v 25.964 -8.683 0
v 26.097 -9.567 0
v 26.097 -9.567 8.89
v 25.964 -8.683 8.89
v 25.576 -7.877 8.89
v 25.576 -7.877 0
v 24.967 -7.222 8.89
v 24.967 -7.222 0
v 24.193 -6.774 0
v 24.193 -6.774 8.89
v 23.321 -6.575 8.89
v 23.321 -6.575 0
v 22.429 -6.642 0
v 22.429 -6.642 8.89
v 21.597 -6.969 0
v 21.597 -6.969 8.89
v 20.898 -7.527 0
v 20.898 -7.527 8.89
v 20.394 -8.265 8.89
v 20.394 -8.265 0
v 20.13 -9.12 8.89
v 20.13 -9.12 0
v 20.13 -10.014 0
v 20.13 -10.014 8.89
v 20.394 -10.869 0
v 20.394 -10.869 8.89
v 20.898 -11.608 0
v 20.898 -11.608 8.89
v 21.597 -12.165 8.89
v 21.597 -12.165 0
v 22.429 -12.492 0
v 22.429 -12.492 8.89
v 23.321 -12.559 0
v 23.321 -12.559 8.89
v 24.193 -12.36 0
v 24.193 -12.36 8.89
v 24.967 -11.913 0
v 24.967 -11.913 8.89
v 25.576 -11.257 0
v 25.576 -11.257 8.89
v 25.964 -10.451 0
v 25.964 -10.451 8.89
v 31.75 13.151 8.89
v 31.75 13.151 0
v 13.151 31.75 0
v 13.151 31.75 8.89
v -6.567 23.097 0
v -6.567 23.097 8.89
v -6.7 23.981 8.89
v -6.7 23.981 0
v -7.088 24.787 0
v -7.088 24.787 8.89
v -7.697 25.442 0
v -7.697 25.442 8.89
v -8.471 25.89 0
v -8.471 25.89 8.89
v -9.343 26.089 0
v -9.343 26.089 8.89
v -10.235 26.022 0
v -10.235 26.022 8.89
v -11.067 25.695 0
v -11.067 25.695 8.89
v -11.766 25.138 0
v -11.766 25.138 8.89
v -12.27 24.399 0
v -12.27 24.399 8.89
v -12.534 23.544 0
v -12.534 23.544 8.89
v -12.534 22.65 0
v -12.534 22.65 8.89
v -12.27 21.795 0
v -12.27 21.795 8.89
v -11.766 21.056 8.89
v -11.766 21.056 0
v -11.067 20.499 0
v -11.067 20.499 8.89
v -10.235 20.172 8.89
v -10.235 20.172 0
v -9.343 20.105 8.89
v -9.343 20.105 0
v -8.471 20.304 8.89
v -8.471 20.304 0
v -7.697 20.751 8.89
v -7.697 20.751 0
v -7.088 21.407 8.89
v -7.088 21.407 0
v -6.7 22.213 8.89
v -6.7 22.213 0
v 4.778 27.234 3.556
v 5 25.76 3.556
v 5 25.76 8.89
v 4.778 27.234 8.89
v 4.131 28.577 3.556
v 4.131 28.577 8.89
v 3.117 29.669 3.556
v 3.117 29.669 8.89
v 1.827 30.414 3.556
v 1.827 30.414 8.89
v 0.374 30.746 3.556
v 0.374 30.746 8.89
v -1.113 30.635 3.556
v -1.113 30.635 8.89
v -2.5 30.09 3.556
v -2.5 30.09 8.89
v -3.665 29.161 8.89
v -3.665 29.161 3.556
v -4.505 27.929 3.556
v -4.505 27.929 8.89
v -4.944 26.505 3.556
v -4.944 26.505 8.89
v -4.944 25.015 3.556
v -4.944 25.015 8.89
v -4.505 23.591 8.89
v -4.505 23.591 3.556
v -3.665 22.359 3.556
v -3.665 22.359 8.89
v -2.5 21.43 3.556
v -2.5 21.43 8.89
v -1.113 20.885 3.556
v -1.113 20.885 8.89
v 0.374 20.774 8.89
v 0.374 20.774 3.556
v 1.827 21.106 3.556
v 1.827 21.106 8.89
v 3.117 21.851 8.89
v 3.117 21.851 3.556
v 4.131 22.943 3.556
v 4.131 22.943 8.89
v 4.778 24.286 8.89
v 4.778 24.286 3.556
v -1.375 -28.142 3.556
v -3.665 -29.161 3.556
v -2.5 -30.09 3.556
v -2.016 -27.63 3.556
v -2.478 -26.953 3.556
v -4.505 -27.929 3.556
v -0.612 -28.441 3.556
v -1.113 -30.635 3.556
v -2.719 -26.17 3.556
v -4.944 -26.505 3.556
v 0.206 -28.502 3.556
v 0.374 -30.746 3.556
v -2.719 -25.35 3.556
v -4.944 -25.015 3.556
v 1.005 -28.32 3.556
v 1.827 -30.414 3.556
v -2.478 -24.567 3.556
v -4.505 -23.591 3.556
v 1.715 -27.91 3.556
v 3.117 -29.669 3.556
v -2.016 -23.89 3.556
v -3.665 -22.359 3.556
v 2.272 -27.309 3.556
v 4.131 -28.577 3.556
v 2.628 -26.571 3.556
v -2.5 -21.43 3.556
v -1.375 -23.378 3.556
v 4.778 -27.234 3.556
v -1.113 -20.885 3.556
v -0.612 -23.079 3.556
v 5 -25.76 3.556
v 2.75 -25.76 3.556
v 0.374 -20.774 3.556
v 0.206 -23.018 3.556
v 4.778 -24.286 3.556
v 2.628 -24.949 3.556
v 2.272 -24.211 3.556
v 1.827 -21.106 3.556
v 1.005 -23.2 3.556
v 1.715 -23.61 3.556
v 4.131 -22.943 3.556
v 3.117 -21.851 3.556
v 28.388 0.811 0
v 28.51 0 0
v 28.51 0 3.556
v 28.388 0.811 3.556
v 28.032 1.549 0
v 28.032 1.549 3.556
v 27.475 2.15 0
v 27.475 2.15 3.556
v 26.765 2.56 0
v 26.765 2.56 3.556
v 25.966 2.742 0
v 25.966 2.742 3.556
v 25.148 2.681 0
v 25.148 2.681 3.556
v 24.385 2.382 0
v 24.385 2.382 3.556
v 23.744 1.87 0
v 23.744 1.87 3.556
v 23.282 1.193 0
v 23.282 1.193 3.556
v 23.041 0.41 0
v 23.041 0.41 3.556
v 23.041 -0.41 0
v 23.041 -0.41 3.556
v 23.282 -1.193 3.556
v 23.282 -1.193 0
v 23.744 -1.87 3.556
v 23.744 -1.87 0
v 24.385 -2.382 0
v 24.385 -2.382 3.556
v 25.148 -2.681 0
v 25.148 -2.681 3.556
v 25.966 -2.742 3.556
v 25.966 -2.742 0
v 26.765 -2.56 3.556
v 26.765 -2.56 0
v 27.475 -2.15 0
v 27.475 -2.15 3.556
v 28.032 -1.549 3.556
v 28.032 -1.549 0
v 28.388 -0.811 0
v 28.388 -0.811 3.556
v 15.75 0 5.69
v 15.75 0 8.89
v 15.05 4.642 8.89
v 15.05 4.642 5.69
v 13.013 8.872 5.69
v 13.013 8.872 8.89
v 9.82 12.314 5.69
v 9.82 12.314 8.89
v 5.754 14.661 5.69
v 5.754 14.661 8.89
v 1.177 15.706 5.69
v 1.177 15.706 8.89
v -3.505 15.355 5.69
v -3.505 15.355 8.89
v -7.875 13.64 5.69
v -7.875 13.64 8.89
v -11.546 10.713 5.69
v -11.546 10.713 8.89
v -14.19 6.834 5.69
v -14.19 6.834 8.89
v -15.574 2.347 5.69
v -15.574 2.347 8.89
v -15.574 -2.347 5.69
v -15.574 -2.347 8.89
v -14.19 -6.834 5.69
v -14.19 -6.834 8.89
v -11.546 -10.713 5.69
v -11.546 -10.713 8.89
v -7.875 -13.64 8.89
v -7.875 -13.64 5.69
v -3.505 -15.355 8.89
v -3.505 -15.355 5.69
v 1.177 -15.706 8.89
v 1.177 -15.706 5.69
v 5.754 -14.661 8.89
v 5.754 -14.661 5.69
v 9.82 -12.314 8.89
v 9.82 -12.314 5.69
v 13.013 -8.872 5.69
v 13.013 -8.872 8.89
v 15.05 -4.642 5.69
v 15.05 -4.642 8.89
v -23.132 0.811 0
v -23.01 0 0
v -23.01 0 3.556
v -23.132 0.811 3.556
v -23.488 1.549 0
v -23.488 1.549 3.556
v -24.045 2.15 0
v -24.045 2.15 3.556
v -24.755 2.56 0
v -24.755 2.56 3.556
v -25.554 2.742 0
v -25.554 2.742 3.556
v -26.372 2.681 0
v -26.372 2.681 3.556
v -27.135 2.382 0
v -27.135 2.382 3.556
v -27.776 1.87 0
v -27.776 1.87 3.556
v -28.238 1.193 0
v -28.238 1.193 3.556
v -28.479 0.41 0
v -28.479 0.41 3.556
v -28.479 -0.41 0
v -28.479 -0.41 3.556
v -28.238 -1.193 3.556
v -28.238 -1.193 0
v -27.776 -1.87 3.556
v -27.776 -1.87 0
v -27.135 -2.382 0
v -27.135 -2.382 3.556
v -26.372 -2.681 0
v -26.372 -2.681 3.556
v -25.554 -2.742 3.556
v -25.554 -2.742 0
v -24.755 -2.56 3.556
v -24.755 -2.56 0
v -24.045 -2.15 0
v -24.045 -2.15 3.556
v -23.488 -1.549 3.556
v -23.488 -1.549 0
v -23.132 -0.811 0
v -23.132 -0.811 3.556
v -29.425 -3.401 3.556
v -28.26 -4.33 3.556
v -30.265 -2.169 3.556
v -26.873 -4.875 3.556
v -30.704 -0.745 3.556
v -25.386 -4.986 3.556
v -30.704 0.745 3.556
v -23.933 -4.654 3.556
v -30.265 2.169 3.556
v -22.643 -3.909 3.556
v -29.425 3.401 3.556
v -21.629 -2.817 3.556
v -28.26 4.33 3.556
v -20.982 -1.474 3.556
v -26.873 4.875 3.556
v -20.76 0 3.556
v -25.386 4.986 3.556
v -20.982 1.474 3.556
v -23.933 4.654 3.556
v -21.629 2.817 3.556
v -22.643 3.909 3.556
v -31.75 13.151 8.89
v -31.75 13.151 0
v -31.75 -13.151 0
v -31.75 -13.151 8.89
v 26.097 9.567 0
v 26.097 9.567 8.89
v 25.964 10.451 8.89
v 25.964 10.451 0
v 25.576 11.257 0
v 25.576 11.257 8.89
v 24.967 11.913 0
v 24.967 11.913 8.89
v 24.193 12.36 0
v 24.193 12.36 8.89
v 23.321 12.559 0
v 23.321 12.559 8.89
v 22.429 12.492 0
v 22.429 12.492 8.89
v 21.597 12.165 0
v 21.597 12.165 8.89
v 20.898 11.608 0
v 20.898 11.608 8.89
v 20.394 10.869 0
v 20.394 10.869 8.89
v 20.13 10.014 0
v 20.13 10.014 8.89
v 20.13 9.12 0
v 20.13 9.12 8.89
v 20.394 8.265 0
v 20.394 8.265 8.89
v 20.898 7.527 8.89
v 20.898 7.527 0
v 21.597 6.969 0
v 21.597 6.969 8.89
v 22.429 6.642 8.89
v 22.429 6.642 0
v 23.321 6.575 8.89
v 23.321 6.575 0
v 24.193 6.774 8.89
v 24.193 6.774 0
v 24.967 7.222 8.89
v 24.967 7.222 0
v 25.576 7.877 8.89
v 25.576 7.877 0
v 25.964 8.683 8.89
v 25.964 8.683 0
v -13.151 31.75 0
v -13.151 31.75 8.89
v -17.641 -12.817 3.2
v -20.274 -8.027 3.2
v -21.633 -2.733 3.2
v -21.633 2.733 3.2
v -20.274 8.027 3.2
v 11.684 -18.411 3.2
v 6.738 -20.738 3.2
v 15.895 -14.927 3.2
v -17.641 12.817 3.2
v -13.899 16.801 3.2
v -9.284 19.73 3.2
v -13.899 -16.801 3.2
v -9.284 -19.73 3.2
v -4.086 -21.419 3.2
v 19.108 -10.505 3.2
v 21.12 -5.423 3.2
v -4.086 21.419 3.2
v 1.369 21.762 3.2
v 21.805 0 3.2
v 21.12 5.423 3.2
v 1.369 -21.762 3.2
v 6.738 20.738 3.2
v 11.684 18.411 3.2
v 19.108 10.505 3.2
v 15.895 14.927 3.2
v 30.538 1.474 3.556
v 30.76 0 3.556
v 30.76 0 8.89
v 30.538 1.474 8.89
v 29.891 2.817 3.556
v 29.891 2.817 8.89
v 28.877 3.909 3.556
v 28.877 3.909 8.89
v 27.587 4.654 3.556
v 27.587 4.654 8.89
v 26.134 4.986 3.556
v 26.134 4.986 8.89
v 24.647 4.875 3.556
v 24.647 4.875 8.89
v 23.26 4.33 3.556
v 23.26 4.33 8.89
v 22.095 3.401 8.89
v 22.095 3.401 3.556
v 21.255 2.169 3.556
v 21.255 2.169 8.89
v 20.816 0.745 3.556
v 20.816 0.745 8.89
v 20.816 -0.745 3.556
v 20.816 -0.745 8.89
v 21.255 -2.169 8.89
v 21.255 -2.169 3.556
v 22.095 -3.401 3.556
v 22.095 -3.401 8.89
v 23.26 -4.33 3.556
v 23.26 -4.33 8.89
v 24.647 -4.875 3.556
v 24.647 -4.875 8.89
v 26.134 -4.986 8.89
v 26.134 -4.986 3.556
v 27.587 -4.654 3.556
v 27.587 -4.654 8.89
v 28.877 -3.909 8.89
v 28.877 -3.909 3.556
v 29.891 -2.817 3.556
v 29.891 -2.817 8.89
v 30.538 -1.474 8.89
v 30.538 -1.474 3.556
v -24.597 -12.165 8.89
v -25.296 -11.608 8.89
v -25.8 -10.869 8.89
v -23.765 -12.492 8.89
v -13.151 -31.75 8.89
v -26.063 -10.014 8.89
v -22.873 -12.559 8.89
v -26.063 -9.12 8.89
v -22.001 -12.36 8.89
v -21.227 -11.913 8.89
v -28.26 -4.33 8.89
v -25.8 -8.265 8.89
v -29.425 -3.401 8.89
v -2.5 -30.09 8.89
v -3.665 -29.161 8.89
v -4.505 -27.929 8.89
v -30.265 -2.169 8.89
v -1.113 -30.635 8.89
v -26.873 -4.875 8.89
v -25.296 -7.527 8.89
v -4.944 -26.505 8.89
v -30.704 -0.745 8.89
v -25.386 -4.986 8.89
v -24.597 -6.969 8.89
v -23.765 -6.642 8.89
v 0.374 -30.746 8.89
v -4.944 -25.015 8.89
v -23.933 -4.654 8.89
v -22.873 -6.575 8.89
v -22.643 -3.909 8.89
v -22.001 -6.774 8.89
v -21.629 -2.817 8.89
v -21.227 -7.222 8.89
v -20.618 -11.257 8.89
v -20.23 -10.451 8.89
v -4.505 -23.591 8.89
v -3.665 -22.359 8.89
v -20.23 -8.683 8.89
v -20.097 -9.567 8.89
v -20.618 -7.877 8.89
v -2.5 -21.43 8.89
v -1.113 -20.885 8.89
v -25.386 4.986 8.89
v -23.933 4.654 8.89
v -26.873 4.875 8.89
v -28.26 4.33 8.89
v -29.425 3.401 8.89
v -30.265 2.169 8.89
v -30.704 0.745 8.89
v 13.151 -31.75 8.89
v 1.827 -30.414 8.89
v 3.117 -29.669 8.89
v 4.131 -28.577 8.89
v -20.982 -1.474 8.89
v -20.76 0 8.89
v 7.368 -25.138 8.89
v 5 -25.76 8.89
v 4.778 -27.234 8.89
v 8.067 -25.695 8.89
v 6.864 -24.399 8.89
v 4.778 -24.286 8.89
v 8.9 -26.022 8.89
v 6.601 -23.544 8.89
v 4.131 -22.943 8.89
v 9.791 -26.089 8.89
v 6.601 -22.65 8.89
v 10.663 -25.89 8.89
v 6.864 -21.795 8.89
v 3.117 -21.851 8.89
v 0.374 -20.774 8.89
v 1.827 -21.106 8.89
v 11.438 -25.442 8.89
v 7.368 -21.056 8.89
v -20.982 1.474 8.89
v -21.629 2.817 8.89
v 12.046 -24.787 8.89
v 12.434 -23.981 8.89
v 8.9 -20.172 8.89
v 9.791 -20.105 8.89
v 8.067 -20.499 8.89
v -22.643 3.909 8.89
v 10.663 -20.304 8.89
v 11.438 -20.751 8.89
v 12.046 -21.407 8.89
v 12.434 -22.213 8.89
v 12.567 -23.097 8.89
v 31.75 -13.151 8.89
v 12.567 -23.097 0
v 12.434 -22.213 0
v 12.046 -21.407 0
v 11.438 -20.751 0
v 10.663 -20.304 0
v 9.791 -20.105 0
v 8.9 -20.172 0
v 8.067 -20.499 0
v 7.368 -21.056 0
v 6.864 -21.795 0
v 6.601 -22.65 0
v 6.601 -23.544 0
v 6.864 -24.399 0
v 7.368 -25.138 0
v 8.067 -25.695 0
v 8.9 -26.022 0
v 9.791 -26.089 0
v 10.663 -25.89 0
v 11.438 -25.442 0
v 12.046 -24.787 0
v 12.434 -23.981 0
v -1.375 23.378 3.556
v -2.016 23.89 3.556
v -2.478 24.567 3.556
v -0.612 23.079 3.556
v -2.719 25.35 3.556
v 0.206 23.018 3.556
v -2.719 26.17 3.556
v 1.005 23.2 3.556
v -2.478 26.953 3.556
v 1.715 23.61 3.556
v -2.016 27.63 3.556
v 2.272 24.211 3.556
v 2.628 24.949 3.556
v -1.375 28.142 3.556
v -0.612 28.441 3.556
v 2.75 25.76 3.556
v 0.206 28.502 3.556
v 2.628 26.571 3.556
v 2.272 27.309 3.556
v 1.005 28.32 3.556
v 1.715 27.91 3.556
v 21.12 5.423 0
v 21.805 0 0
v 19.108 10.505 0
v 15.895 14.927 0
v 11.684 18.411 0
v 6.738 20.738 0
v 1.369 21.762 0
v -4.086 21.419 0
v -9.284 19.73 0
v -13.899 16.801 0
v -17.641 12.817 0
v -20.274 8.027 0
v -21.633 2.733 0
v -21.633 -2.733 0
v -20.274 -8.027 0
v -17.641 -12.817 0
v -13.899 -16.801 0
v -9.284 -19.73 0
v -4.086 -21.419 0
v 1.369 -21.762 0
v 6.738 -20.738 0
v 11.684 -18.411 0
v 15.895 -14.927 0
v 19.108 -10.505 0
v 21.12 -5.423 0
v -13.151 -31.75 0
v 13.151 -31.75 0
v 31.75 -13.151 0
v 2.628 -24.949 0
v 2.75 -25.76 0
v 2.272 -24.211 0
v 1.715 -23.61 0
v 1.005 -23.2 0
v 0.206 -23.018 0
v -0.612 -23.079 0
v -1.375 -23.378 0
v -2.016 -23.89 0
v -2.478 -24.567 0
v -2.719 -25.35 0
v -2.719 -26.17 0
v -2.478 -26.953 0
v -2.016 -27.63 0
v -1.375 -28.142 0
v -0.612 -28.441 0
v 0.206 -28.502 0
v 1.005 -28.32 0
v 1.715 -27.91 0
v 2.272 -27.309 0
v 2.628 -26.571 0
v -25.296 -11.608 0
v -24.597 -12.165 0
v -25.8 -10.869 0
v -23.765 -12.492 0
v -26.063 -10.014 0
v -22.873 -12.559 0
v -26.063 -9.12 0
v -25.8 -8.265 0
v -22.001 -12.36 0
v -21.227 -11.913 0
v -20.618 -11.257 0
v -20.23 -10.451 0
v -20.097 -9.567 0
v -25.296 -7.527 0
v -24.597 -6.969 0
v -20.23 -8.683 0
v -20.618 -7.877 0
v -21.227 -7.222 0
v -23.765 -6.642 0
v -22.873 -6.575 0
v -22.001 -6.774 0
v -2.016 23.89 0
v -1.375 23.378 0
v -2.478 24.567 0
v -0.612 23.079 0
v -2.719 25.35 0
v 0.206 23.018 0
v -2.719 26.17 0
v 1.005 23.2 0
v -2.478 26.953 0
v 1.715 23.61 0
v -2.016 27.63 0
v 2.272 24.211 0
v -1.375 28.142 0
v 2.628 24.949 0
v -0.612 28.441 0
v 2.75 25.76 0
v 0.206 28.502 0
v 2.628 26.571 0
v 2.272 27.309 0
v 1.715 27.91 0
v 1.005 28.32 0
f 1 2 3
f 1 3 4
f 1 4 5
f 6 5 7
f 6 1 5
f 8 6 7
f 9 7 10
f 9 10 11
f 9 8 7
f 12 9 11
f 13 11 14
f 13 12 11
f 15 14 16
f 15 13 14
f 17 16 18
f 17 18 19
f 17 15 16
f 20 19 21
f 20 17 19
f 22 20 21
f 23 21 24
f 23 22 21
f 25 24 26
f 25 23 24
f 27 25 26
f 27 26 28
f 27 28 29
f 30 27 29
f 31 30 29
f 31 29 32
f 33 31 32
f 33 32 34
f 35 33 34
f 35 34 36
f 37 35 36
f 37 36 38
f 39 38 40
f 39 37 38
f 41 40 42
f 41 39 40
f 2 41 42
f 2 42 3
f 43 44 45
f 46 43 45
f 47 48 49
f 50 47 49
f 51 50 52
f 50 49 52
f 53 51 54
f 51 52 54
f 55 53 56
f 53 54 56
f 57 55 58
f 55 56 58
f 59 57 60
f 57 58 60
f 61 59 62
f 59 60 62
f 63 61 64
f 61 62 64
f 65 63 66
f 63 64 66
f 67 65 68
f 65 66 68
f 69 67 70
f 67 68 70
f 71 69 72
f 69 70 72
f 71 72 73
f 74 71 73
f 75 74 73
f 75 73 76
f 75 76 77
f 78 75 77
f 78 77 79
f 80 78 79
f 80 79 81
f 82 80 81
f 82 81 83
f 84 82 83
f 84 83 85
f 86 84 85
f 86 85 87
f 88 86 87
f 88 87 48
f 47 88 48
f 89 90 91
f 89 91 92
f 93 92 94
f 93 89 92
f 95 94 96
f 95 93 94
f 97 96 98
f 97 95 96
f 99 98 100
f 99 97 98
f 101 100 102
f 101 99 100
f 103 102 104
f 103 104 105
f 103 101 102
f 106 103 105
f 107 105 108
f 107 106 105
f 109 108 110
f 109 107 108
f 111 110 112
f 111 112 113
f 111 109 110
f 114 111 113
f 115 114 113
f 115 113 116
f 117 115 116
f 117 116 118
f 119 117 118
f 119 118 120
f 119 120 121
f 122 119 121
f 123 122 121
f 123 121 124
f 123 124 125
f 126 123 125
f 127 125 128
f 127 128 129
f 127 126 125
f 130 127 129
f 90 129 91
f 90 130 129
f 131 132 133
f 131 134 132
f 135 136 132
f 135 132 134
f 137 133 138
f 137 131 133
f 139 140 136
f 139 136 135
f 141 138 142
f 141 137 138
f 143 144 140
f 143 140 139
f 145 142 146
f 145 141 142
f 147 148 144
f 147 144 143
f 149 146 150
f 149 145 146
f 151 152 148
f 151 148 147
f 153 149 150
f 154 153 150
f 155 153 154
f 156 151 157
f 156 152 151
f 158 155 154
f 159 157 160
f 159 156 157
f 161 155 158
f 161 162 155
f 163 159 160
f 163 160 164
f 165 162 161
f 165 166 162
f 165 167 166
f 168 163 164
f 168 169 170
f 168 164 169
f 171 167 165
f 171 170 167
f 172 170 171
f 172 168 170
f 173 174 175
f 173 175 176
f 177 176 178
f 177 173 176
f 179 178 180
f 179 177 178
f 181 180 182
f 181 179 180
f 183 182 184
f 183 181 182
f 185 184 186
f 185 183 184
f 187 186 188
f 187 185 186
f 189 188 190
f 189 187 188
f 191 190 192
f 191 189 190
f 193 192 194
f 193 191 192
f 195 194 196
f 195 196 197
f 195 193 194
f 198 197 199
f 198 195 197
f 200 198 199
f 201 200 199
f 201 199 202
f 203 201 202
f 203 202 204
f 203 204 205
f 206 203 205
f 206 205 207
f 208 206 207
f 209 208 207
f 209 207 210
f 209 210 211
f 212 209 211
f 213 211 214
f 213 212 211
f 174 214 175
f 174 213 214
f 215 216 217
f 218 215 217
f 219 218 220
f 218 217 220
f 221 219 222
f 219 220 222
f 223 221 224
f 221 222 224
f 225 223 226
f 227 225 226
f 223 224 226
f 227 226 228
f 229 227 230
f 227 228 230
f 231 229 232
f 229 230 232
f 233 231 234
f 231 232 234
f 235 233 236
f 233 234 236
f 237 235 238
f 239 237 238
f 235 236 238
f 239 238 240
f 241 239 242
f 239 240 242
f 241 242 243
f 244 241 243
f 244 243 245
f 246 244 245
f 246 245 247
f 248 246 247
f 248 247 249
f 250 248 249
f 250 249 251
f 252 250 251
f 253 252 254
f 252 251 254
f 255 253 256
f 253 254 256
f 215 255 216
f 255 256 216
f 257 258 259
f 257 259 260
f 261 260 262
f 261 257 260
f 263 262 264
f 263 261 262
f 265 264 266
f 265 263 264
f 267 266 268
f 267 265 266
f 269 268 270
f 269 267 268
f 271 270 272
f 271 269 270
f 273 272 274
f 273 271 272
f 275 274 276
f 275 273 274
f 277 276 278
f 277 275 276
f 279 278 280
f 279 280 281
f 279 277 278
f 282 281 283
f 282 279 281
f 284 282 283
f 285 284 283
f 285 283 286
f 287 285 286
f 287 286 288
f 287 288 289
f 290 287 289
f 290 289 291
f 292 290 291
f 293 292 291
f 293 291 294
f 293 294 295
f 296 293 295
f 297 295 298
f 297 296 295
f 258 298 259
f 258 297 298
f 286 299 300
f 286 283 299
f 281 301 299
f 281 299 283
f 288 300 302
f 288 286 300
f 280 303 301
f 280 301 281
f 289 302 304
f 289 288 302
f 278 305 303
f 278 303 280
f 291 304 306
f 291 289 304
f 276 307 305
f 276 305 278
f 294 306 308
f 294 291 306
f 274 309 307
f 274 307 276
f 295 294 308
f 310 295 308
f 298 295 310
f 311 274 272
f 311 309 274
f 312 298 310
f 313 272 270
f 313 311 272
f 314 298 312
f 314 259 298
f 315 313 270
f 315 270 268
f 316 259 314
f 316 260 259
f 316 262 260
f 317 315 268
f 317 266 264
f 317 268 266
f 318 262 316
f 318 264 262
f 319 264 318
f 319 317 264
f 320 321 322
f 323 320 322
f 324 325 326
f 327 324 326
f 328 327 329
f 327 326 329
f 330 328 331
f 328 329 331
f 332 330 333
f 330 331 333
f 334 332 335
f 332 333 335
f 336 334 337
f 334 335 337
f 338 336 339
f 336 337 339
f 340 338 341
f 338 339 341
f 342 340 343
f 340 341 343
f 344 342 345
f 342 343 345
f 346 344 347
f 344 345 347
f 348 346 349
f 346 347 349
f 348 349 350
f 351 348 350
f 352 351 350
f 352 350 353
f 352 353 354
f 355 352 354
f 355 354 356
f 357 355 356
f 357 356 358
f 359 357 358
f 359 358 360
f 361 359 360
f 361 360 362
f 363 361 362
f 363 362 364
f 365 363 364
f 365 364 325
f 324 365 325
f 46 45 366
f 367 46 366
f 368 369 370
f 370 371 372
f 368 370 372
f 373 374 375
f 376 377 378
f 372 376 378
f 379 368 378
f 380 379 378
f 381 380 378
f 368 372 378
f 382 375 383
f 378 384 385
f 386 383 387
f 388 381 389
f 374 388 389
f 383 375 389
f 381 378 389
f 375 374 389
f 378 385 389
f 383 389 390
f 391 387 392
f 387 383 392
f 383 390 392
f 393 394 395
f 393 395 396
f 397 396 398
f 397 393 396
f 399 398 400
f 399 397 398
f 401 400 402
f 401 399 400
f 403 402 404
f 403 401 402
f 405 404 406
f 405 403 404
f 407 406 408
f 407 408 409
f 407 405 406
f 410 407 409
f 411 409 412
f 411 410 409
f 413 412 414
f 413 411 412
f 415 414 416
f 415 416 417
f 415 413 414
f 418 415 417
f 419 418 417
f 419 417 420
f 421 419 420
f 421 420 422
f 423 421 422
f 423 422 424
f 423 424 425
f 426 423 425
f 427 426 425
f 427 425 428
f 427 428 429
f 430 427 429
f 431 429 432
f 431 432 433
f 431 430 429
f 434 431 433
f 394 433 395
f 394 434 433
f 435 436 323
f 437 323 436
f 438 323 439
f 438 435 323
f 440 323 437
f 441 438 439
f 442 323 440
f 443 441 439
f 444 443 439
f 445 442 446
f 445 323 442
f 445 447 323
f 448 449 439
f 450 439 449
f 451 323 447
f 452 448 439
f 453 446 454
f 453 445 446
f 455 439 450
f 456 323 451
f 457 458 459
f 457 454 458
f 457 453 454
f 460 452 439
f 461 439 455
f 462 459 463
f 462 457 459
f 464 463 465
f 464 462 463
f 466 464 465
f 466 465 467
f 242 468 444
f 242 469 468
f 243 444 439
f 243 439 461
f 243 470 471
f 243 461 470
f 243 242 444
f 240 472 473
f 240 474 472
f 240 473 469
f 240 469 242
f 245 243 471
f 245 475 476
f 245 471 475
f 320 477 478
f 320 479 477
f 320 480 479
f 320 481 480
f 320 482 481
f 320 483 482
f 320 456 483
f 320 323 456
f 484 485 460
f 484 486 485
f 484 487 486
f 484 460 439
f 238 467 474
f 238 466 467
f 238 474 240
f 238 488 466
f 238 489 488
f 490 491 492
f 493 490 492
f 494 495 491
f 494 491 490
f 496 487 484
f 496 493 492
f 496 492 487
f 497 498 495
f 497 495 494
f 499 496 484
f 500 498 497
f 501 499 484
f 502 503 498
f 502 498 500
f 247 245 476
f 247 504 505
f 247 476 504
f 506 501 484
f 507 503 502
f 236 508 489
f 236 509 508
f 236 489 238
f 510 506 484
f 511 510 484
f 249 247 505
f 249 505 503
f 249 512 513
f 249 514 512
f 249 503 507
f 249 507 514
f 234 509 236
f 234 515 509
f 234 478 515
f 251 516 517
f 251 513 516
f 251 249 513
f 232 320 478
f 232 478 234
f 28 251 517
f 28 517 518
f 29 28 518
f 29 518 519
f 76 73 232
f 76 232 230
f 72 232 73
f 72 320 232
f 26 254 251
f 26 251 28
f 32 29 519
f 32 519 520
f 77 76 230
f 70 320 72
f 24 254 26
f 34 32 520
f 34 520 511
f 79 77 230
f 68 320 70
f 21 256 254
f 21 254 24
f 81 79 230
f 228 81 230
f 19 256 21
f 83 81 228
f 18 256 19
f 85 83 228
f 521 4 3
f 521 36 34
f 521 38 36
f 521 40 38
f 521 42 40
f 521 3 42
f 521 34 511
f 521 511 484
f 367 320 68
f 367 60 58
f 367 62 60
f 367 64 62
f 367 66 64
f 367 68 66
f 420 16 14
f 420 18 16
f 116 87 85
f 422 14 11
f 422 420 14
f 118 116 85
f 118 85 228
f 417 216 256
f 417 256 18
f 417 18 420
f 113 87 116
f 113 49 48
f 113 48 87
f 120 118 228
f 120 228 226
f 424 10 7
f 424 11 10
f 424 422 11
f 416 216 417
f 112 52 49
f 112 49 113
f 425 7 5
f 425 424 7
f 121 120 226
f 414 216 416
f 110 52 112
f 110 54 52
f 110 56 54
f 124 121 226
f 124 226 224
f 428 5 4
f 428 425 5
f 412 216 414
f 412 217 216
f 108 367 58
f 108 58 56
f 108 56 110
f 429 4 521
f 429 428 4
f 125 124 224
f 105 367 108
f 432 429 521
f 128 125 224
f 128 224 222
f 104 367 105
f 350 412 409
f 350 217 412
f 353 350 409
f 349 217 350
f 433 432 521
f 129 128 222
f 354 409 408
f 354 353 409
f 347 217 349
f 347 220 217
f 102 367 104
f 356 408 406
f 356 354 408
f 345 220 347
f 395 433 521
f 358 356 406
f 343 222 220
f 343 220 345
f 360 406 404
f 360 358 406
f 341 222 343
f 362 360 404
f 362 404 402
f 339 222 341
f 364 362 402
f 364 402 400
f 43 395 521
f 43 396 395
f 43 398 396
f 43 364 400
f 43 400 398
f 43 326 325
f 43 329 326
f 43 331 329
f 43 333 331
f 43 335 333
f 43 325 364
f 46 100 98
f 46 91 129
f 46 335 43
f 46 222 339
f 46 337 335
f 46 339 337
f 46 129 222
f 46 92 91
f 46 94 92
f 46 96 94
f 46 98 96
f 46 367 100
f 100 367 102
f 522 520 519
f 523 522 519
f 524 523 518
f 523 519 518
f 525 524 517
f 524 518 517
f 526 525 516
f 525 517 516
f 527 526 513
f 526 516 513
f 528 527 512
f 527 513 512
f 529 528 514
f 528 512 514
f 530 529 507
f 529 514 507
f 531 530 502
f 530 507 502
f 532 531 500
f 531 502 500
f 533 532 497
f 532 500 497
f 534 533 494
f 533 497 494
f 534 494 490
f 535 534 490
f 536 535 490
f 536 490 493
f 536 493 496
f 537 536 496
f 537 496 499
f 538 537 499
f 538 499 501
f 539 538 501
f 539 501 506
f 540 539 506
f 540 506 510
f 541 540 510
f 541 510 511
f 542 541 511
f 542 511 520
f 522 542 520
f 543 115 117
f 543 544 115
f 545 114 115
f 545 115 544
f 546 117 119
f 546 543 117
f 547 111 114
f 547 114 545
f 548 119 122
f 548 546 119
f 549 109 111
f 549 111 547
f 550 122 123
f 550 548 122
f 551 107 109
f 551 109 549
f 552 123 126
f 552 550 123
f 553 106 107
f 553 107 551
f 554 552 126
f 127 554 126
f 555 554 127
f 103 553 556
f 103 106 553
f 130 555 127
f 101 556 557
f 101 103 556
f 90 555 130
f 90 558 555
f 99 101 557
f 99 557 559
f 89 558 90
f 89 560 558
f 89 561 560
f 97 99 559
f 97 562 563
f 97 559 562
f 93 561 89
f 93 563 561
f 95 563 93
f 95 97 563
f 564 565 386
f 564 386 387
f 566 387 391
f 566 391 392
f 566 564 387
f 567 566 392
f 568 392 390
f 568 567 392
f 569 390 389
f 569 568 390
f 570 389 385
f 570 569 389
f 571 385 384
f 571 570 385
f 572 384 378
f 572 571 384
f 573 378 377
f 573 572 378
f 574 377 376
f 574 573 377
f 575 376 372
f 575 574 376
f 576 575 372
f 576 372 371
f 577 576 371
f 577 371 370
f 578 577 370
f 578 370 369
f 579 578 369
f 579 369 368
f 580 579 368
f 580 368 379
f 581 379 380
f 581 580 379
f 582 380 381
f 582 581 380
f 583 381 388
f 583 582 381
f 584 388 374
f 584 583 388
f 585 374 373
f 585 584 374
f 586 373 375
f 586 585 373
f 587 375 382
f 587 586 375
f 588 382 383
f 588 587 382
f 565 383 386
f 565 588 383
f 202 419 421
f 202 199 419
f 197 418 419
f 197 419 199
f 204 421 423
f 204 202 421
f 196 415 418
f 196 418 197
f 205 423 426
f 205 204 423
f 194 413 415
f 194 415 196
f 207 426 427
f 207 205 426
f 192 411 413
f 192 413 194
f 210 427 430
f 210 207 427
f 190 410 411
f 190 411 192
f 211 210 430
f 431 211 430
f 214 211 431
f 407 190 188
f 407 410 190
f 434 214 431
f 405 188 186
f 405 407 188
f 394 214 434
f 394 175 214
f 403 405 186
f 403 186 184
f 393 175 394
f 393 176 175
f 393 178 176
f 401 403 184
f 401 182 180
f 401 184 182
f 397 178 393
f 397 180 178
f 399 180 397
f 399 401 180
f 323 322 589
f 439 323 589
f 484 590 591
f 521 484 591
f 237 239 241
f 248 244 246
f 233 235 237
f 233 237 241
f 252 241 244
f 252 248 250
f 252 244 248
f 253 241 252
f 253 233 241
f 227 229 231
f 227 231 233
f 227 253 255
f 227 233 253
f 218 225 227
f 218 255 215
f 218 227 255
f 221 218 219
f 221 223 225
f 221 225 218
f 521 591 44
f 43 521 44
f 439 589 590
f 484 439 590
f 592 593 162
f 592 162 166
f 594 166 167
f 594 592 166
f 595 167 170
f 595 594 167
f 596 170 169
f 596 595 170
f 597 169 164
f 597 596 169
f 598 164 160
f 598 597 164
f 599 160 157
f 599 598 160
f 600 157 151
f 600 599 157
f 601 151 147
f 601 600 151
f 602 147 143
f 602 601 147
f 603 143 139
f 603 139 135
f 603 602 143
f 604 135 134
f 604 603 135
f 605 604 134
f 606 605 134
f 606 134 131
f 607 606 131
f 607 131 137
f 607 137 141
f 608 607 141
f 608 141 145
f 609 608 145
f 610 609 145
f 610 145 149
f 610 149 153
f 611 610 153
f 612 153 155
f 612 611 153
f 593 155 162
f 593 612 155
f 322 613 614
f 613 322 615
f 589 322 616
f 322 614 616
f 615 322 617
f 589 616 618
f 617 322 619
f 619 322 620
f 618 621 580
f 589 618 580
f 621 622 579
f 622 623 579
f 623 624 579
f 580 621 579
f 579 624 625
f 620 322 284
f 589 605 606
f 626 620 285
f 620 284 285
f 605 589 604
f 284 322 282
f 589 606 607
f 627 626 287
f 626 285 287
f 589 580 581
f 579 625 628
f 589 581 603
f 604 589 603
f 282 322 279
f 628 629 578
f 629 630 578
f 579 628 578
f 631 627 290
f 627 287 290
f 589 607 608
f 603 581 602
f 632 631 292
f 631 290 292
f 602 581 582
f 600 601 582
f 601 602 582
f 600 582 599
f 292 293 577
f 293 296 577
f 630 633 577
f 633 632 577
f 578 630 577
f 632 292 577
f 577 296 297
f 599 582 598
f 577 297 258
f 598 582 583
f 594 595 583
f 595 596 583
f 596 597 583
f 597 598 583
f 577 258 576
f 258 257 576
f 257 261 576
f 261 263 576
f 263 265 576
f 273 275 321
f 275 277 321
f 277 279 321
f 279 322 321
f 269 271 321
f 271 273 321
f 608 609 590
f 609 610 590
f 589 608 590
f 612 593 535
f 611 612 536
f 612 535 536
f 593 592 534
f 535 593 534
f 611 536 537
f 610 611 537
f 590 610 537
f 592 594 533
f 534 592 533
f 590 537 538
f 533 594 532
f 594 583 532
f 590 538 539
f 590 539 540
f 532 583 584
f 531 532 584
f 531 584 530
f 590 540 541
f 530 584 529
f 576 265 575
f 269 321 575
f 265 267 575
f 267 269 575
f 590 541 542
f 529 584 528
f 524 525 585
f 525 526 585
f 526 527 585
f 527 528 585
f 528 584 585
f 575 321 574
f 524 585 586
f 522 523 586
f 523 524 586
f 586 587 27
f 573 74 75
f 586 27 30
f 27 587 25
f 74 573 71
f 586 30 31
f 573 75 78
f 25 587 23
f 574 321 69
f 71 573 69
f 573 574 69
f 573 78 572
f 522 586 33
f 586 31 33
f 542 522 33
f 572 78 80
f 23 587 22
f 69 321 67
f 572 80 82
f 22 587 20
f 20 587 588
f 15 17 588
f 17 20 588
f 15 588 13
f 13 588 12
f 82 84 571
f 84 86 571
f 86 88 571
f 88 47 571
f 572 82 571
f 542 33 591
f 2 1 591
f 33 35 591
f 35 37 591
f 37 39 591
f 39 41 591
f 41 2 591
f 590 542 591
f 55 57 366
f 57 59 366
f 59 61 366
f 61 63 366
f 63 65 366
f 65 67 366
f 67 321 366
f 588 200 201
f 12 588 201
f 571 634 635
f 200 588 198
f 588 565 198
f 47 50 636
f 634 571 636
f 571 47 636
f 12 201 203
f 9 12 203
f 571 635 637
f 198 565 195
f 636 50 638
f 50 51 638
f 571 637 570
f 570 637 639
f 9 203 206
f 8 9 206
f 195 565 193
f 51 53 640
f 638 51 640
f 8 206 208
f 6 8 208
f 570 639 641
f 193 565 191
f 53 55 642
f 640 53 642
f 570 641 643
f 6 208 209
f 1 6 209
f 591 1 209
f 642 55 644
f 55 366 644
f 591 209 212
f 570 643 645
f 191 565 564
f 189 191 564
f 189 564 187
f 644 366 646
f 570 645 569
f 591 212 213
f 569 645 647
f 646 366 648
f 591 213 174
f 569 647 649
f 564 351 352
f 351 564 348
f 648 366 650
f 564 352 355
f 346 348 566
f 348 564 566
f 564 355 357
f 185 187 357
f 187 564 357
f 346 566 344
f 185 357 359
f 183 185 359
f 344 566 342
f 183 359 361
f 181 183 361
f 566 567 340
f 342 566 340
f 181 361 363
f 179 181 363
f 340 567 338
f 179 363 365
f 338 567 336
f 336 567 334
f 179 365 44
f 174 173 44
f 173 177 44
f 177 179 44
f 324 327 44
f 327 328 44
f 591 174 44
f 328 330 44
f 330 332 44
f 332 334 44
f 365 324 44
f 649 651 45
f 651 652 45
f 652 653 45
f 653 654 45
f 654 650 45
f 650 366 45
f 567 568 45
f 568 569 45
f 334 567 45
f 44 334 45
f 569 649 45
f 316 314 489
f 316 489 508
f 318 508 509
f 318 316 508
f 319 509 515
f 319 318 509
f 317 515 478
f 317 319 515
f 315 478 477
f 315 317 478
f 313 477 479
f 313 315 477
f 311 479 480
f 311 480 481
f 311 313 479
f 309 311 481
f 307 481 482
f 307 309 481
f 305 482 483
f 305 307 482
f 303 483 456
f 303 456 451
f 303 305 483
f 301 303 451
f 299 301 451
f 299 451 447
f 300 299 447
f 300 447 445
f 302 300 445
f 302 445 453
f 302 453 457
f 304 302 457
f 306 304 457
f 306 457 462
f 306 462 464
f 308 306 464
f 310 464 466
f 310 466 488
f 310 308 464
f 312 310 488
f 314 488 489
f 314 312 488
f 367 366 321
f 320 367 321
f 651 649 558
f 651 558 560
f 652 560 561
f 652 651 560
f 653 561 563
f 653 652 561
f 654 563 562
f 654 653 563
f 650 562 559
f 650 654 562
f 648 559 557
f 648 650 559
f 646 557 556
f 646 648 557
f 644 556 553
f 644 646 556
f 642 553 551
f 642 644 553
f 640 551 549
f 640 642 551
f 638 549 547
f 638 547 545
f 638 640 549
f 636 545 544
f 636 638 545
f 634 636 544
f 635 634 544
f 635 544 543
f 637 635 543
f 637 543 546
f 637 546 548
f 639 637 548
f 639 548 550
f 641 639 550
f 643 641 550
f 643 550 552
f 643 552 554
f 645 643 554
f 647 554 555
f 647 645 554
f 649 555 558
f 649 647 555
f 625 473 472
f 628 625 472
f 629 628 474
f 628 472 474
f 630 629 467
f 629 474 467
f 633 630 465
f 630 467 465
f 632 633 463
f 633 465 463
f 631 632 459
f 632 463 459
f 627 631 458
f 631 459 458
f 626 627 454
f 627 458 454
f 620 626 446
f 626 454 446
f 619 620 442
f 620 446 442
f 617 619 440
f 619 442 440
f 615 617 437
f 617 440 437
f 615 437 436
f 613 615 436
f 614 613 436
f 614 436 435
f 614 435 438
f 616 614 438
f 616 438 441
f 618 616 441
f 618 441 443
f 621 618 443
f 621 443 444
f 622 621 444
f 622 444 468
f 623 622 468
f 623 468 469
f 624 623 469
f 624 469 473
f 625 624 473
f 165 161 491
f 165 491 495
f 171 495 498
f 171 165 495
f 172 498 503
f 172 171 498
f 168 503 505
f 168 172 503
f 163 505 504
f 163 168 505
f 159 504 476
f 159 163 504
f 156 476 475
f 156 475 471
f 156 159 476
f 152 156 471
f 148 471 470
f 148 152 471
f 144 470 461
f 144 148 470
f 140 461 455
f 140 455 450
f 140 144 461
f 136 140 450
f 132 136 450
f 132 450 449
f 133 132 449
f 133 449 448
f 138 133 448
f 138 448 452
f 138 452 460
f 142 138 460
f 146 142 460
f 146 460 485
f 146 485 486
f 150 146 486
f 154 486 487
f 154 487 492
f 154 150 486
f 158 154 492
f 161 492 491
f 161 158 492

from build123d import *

# Parameters (mm, degrees)
BOSS_EXTRUDE1_DEPTH       = 8.89
SKETCH2_3_R               = 21.805
CUT_EXTRUDE1_DEPTH        = 3.2
ADVANCEDHOLE1_START       = 3.556
ADVANCEDHOLE1_OUTLINE_R   = 5
ADVANCEDHOLE1_DEPTH       = 5.334
ADVANCEDHOLE1_2_OUTLINE_R = 2.75
ADVANCEDHOLE1_2_DEPTH     = 3.556
SKETCH12_R                = 15.75
CUT_EXTRUDE2_DEPTH        = 3.2
ADVANCEDHOLE5_OUTLINE_R   = 3
ADVANCEDHOLE5_DEPTH       = 8.89
M6X1_0_TAPPED_HOLE1_D     = 6


# Read off the part's stored shape, not the designer's step: AdvancedHole1, AdvancedHole5
with BuildPart() as part:
    # Sketch2 → Boss-Extrude1 (new body)
    with BuildSketch(Plane.XY):
        Polygon((-13.151280605, 31.75), (-31.75, 13.151280605), (-31.75, -13.151280605), (-13.151280605, -31.75), (13.151280605, -31.75), (31.75, -13.151280605), (31.75, 13.151280605), (13.151280605, 31.75), align=None)
    extrude(amount=BOSS_EXTRUDE1_DEPTH)

    # Sketch2<3> → Cut-Extrude1 (cut)
    with BuildSketch(Plane.XY):
        Circle(SKETCH2_3_R)
    extrude(amount=CUT_EXTRUDE1_DEPTH, mode=Mode.SUBTRACT)

    # AdvancedHole1 outline → AdvancedHole1 (cut)
    with BuildSketch(Plane.XY.offset(ADVANCEDHOLE1_START)):
        with Locations((-25.76, 0)):
            Circle(ADVANCEDHOLE1_OUTLINE_R)
        with Locations((0, -25.76)):
            Circle(ADVANCEDHOLE1_OUTLINE_R)
        with Locations((25.76, 0)):
            Circle(ADVANCEDHOLE1_OUTLINE_R)
        with Locations((0, 25.76)):
            Circle(ADVANCEDHOLE1_OUTLINE_R)
    extrude(amount=ADVANCEDHOLE1_DEPTH, mode=Mode.SUBTRACT)

    # AdvancedHole1 2 outline → AdvancedHole1 2 (cut)
    with BuildSketch(Plane.XY):
        with Locations((-25.76, 0)):
            Circle(ADVANCEDHOLE1_2_OUTLINE_R)
        with Locations((0, -25.76)):
            Circle(ADVANCEDHOLE1_2_OUTLINE_R)
        with Locations((25.76, 0)):
            Circle(ADVANCEDHOLE1_2_OUTLINE_R)
        with Locations((0, 25.76)):
            Circle(ADVANCEDHOLE1_2_OUTLINE_R)
    extrude(amount=ADVANCEDHOLE1_2_DEPTH, mode=Mode.SUBTRACT)

    # Sketch12 → Cut-Extrude2 (cut)
    with BuildSketch(Plane.XY.offset(8.89)):
        Circle(SKETCH12_R)
    extrude(amount=-CUT_EXTRUDE2_DEPTH, mode=Mode.SUBTRACT)

    # AdvancedHole5 outline → AdvancedHole5 (cut)
    with BuildSketch(Plane.XY):
        with Locations((23.096988313, -9.567085809)):
            Circle(ADVANCEDHOLE5_OUTLINE_R)
    extrude(amount=ADVANCEDHOLE5_DEPTH, mode=Mode.SUBTRACT)

    # M6x1.0 Tapped Hole1 (through all)
    with Locations(Plane(origin=(-9.567085809, 23.096988313, 0), x_dir=(-1, 0, 0), z_dir=(0, 0, -1))):
        with Locations((0, 0), (-32.664074122, -13.529902504), (-19.134171618, -46.193976626), (13.529902504, -32.664074122)):
            Hole(M6X1_0_TAPPED_HOLE1_D / 2)


solid = part.part
